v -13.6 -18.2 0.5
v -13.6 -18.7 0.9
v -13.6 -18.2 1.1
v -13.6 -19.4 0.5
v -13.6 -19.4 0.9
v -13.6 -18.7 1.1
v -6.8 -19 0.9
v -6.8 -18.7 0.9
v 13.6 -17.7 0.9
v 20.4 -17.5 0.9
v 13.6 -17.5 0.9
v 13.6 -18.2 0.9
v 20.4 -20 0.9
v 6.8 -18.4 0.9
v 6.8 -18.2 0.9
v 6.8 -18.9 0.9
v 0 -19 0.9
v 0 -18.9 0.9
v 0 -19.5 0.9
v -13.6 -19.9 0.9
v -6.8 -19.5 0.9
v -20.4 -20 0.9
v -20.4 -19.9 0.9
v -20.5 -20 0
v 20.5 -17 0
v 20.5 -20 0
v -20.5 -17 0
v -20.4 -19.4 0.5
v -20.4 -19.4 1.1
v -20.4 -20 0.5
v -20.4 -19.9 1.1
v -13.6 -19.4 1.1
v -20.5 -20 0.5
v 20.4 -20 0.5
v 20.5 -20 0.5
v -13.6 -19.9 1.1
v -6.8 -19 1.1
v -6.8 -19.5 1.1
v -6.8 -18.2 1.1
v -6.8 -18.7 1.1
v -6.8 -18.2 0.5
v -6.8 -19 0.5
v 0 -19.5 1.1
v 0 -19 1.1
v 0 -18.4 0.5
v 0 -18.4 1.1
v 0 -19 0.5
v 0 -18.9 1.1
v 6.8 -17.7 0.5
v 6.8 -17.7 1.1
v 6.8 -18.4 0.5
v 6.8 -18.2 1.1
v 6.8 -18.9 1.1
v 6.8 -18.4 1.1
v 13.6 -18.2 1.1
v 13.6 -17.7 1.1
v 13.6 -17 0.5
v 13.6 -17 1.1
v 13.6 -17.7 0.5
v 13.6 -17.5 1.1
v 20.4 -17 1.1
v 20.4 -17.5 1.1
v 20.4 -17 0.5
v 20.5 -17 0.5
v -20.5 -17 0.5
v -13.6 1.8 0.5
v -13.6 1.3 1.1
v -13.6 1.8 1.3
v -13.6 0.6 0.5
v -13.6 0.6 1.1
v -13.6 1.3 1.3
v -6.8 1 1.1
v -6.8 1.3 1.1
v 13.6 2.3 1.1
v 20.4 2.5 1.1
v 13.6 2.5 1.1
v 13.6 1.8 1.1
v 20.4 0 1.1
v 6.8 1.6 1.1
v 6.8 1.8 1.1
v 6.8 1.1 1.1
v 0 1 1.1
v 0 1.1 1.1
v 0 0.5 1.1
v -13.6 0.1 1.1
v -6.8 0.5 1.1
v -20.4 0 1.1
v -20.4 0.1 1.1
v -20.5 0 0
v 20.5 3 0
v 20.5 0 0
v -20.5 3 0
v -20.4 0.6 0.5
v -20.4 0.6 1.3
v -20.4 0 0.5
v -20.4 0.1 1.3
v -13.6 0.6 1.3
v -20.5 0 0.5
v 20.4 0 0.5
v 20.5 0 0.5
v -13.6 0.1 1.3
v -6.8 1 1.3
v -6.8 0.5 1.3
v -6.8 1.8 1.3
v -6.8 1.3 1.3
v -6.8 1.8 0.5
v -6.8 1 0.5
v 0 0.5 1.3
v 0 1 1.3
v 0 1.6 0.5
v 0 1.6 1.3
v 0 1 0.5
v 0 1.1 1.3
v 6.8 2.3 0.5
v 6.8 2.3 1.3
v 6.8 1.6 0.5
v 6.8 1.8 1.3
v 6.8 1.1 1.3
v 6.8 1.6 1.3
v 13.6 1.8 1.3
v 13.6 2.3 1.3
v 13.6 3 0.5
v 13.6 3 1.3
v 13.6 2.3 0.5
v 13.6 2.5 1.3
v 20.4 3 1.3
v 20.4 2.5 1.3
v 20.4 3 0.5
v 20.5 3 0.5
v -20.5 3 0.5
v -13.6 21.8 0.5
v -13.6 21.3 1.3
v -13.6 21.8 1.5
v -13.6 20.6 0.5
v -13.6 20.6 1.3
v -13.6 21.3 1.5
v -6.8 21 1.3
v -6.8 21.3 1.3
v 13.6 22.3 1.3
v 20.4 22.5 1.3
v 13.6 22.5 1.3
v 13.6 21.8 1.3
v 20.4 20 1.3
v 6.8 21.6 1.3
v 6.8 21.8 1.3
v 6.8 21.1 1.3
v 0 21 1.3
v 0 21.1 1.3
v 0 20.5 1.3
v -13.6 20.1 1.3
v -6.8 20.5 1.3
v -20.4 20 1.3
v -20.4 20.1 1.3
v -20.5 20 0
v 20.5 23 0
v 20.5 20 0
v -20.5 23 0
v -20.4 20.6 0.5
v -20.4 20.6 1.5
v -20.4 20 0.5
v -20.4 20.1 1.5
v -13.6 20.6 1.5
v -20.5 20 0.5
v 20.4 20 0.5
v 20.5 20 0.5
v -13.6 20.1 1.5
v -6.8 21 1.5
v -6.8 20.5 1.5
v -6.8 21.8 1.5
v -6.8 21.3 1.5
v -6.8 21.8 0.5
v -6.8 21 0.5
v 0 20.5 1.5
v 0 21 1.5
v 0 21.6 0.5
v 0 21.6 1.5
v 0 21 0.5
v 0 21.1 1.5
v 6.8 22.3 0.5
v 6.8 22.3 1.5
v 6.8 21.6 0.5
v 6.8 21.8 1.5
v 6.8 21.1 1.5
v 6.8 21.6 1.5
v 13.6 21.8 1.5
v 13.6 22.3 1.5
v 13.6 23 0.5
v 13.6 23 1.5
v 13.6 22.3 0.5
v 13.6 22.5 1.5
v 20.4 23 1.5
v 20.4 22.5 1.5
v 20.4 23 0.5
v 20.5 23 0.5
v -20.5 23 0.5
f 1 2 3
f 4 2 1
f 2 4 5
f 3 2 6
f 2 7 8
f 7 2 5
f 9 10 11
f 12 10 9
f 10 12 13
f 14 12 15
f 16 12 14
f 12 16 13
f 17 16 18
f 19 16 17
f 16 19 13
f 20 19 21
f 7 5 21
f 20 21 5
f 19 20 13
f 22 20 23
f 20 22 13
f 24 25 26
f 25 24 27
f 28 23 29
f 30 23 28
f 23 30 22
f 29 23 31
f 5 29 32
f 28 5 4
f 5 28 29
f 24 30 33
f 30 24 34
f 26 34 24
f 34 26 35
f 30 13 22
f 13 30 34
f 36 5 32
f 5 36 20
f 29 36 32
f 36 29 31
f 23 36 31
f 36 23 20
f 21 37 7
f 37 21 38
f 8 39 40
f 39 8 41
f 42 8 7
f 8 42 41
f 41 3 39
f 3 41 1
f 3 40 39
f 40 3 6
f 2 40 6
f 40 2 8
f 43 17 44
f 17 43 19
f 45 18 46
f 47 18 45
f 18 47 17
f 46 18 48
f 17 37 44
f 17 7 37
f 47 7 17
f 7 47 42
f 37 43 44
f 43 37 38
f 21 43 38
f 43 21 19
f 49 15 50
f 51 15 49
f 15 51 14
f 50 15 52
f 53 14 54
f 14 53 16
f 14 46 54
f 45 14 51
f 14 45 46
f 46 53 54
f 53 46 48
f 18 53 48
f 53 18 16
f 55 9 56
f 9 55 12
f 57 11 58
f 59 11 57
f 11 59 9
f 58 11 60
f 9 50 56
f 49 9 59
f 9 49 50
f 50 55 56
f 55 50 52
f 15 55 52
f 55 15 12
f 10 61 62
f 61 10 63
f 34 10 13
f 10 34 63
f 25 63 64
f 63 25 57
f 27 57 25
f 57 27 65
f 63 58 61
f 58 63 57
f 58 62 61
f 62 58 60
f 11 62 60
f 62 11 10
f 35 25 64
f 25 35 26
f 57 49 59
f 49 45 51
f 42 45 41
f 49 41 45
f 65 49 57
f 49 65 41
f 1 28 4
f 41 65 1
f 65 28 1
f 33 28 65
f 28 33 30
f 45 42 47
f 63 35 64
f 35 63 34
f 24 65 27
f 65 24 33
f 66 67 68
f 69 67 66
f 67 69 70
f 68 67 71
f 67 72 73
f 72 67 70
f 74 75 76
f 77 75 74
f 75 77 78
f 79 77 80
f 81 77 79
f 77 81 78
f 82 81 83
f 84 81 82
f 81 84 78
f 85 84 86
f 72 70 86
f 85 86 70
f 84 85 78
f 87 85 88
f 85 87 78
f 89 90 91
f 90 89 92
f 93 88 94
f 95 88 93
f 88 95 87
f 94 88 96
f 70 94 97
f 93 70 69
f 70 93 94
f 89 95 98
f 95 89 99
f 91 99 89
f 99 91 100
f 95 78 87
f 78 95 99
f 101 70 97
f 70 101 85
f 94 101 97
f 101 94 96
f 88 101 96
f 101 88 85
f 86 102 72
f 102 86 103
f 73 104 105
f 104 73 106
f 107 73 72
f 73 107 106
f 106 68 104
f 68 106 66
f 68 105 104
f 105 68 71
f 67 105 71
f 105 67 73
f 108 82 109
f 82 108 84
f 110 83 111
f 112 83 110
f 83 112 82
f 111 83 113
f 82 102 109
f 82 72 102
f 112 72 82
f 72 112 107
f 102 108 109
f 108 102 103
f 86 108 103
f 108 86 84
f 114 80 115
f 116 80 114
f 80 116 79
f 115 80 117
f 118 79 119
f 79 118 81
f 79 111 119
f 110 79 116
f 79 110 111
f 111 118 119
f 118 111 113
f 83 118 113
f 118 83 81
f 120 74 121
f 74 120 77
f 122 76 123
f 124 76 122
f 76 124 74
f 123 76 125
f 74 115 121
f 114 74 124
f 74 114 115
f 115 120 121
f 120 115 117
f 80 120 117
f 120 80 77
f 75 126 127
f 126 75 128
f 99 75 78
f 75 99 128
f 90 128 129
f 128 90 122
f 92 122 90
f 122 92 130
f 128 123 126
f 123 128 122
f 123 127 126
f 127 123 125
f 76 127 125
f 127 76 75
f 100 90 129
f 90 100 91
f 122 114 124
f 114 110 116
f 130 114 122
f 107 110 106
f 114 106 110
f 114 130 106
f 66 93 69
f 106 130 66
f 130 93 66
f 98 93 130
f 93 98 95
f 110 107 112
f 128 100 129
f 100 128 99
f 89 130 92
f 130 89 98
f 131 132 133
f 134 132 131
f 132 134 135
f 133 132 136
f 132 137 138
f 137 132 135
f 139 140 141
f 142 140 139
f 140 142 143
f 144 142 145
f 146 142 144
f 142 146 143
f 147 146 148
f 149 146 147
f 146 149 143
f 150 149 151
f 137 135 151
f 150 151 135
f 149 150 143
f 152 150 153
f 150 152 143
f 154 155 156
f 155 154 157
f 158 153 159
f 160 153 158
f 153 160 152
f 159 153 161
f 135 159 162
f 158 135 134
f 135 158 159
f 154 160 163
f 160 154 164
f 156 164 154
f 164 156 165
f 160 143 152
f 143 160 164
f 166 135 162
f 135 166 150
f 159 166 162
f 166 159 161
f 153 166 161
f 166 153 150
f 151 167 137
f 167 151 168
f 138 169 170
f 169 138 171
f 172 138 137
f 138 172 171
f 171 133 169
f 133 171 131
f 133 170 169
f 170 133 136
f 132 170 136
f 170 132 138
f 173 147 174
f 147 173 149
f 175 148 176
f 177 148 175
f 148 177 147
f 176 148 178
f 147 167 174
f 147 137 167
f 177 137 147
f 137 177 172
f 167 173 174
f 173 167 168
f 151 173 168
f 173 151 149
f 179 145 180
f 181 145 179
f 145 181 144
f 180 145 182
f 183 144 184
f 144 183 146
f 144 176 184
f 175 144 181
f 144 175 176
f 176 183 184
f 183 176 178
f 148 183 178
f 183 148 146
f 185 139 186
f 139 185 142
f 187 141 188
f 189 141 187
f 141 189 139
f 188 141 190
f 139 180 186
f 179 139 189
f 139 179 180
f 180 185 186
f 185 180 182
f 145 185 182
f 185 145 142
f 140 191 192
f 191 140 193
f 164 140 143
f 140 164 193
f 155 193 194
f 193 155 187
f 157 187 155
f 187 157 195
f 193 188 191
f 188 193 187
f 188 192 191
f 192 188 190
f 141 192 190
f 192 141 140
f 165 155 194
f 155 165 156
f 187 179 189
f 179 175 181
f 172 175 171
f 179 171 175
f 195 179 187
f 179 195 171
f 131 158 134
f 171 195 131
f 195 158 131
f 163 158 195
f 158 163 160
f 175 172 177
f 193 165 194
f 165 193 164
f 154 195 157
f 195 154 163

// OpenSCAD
neck_width = 41;
strings_gap = 6.8;
base_height = 0.5;
action = 1.3;
compensation = [0.6, 1.8, 1, 1.6, 2.3, 3];
extrusion_width = 0.5;
layer = 0.2;

for (i=[-1:1]) {
  translate ([0, i*20, 0]) {
    compensation(compensation, action+(i*layer));
  }
}

module compensation (compensations, action) {
compensator_width = max(compensations);    
union() {
translate([-neck_width/2, 0, 0]) 
    cube([neck_width, compensator_width, base_height]);
for (i=[0:5]) {
  translate([(i-3)*strings_gap,0,0]) 
      cube ([strings_gap, compensation[i], action-layer]);   
  translate([(i-3)*strings_gap,compensation[i]-extrusion_width, 0])
      cube ([strings_gap, extrusion_width, action]);
}
}
}
